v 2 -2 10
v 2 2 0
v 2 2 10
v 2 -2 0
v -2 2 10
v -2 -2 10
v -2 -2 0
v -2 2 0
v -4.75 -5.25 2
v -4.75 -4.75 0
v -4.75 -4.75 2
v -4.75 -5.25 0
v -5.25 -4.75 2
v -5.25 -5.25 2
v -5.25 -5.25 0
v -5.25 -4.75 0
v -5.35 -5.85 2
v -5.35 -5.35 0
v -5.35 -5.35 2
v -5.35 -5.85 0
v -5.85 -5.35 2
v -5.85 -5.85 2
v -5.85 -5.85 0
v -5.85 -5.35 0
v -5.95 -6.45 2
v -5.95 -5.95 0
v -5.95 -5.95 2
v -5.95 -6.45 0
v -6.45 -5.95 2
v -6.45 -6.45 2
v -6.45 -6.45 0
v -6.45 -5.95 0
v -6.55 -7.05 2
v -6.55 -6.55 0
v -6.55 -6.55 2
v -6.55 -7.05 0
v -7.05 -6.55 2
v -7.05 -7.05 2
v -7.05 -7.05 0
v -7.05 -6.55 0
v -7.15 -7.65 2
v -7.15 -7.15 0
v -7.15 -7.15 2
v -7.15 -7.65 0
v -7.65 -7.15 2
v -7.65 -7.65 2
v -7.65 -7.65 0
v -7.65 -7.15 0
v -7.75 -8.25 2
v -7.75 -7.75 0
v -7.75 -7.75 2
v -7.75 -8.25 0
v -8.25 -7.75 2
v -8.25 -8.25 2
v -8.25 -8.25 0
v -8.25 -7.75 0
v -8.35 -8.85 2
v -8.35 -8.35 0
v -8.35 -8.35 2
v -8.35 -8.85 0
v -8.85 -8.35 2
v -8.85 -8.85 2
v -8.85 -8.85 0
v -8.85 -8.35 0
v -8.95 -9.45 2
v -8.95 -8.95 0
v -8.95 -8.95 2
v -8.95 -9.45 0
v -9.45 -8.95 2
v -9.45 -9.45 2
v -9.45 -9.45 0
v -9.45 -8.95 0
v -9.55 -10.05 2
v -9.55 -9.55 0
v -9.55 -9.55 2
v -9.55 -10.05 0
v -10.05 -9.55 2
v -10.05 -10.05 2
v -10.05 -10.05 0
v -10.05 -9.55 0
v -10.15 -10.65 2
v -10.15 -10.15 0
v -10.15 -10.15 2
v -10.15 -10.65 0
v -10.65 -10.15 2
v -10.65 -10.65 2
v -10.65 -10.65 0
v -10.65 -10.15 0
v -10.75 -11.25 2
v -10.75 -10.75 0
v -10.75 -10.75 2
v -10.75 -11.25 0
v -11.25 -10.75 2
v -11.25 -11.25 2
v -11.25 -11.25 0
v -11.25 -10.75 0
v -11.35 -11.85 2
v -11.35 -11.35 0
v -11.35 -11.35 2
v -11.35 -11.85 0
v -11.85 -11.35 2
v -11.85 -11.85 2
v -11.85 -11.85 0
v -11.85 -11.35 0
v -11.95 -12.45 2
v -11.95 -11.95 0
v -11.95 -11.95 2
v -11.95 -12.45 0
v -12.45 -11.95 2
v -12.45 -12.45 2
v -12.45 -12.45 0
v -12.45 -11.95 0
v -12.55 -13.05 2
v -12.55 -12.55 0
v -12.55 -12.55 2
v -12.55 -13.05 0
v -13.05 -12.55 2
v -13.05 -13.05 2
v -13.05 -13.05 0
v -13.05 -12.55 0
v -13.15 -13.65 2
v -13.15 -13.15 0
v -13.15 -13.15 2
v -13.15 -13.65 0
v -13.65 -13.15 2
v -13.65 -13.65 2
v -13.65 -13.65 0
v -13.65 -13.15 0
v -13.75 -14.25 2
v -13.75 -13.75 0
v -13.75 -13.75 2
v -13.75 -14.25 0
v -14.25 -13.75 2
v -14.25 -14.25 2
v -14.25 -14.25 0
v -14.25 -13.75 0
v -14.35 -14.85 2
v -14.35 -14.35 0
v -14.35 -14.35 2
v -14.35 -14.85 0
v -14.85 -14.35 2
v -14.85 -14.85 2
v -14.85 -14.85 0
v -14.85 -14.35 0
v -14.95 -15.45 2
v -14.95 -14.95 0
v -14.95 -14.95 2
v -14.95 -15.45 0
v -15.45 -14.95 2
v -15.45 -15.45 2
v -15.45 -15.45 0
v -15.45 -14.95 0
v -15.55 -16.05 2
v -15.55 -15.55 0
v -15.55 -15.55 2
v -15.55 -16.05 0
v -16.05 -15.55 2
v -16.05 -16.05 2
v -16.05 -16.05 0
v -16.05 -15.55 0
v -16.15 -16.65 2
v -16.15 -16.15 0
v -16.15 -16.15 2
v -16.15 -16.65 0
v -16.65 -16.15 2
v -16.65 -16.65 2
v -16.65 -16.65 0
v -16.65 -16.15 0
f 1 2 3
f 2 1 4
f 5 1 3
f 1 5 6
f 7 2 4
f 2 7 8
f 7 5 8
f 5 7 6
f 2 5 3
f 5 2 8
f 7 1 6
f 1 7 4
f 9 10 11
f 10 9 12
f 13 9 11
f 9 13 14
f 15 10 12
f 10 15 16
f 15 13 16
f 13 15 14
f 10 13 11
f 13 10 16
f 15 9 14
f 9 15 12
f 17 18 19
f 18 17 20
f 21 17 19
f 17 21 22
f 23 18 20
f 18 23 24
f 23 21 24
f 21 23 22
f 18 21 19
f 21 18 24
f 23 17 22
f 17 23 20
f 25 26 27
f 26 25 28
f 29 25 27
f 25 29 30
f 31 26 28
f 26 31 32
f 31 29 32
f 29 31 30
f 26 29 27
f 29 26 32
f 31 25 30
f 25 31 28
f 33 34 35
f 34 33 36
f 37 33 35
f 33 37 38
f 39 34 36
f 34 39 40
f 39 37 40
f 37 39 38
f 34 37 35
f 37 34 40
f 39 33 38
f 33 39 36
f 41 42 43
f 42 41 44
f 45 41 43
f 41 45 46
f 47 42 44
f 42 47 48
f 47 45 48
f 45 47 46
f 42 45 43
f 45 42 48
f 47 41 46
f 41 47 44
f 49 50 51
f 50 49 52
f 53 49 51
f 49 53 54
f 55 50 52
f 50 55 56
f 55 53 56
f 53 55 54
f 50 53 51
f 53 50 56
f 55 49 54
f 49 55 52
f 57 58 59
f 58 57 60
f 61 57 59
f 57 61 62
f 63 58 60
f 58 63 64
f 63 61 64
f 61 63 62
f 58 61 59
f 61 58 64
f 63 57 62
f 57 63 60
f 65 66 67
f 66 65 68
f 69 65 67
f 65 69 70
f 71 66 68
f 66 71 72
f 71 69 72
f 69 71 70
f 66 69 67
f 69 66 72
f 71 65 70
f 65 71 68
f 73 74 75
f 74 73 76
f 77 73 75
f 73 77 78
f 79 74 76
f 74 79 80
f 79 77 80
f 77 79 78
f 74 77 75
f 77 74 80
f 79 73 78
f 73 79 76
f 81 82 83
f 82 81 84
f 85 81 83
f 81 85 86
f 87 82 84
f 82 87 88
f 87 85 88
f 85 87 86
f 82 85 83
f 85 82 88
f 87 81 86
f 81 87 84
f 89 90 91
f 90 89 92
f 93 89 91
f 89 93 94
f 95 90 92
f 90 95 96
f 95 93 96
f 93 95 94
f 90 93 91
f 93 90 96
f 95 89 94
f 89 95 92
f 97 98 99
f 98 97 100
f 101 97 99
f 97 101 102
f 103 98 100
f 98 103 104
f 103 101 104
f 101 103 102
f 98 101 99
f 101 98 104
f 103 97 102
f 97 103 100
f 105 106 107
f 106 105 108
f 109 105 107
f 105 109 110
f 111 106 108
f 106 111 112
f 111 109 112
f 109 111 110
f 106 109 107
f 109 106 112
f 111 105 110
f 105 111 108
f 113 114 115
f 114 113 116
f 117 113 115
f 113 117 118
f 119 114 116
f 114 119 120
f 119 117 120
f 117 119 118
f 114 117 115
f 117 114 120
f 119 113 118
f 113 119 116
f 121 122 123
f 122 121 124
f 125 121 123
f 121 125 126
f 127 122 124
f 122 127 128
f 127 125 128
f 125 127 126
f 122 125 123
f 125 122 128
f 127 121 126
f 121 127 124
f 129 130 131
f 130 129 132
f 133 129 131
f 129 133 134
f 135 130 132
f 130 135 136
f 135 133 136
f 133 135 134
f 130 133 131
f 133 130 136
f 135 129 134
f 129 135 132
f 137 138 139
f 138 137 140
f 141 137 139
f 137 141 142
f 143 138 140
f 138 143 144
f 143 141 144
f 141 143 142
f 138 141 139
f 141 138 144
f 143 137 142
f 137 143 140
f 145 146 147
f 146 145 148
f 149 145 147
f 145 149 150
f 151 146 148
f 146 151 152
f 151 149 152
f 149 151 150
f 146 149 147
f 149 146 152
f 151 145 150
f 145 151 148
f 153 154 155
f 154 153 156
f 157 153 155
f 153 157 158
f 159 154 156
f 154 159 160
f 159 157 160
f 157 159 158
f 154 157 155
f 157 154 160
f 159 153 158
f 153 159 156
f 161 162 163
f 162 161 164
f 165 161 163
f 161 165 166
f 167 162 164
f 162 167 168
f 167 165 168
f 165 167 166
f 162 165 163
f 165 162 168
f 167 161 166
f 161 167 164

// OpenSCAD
translate([0, 0, 5]) color([0,1,0,0.9]) cube([4, 4, 10], center=true);
translate([-5.0, -5.0, 1]) color([1,0,0]) cube([0.5, 0.5, 2], center=true);
translate([-5.6, -5.6, 1]) color([1,0,0]) cube([0.5, 0.5, 2], center=true);
translate([-6.2, -6.2, 1]) color([1,0,0]) cube([0.5, 0.5, 2], center=true);
translate([-6.8, -6.8, 1]) color([1,0,0]) cube([0.5, 0.5, 2], center=true);
translate([-7.4, -7.4, 1]) color([1,0,0]) cube([0.5, 0.5, 2], center=true);
translate([-8.0, -8.0, 1]) color([1,0,0]) cube([0.5, 0.5, 2], center=true);
translate([-8.6, -8.6, 1]) color([1,0,0]) cube([0.5, 0.5, 2], center=true);
translate([-9.2, -9.2, 1]) color([1,0,0]) cube([0.5, 0.5, 2], center=true);
translate([-9.8, -9.8, 1]) color([1,0,0]) cube([0.5, 0.5, 2], center=true);
translate([-10.4, -10.4, 1]) color([1,0,0]) cube([0.5, 0.5, 2], center=true);
translate([-11.0, -11.0, 1]) color([1,0,0]) cube([0.5, 0.5, 2], center=true);
translate([-11.6, -11.6, 1]) color([1,0,0]) cube([0.5, 0.5, 2], center=true);
translate([-12.2, -12.2, 1]) color([1,0,0]) cube([0.5, 0.5, 2], center=true);
translate([-12.8, -12.8, 1]) color([1,0,0]) cube([0.5, 0.5, 2], center=true);
translate([-13.4, -13.4, 1]) color([1,0,0]) cube([0.5, 0.5, 2], center=true);
translate([-14.0, -14.0, 1]) color([1,0,0]) cube([0.5, 0.5, 2], center=true);
translate([-14.6, -14.6, 1]) color([1,0,0]) cube([0.5, 0.5, 2], center=true);
translate([-15.2, -15.2, 1]) color([1,0,0]) cube([0.5, 0.5, 2], center=true);
translate([-15.8, -15.8, 1]) color([1,0,0]) cube([0.5, 0.5, 2], center=true);
translate([-16.4, -16.4, 1]) color([1,0,0]) cube([0.5, 0.5, 2], center=true);
